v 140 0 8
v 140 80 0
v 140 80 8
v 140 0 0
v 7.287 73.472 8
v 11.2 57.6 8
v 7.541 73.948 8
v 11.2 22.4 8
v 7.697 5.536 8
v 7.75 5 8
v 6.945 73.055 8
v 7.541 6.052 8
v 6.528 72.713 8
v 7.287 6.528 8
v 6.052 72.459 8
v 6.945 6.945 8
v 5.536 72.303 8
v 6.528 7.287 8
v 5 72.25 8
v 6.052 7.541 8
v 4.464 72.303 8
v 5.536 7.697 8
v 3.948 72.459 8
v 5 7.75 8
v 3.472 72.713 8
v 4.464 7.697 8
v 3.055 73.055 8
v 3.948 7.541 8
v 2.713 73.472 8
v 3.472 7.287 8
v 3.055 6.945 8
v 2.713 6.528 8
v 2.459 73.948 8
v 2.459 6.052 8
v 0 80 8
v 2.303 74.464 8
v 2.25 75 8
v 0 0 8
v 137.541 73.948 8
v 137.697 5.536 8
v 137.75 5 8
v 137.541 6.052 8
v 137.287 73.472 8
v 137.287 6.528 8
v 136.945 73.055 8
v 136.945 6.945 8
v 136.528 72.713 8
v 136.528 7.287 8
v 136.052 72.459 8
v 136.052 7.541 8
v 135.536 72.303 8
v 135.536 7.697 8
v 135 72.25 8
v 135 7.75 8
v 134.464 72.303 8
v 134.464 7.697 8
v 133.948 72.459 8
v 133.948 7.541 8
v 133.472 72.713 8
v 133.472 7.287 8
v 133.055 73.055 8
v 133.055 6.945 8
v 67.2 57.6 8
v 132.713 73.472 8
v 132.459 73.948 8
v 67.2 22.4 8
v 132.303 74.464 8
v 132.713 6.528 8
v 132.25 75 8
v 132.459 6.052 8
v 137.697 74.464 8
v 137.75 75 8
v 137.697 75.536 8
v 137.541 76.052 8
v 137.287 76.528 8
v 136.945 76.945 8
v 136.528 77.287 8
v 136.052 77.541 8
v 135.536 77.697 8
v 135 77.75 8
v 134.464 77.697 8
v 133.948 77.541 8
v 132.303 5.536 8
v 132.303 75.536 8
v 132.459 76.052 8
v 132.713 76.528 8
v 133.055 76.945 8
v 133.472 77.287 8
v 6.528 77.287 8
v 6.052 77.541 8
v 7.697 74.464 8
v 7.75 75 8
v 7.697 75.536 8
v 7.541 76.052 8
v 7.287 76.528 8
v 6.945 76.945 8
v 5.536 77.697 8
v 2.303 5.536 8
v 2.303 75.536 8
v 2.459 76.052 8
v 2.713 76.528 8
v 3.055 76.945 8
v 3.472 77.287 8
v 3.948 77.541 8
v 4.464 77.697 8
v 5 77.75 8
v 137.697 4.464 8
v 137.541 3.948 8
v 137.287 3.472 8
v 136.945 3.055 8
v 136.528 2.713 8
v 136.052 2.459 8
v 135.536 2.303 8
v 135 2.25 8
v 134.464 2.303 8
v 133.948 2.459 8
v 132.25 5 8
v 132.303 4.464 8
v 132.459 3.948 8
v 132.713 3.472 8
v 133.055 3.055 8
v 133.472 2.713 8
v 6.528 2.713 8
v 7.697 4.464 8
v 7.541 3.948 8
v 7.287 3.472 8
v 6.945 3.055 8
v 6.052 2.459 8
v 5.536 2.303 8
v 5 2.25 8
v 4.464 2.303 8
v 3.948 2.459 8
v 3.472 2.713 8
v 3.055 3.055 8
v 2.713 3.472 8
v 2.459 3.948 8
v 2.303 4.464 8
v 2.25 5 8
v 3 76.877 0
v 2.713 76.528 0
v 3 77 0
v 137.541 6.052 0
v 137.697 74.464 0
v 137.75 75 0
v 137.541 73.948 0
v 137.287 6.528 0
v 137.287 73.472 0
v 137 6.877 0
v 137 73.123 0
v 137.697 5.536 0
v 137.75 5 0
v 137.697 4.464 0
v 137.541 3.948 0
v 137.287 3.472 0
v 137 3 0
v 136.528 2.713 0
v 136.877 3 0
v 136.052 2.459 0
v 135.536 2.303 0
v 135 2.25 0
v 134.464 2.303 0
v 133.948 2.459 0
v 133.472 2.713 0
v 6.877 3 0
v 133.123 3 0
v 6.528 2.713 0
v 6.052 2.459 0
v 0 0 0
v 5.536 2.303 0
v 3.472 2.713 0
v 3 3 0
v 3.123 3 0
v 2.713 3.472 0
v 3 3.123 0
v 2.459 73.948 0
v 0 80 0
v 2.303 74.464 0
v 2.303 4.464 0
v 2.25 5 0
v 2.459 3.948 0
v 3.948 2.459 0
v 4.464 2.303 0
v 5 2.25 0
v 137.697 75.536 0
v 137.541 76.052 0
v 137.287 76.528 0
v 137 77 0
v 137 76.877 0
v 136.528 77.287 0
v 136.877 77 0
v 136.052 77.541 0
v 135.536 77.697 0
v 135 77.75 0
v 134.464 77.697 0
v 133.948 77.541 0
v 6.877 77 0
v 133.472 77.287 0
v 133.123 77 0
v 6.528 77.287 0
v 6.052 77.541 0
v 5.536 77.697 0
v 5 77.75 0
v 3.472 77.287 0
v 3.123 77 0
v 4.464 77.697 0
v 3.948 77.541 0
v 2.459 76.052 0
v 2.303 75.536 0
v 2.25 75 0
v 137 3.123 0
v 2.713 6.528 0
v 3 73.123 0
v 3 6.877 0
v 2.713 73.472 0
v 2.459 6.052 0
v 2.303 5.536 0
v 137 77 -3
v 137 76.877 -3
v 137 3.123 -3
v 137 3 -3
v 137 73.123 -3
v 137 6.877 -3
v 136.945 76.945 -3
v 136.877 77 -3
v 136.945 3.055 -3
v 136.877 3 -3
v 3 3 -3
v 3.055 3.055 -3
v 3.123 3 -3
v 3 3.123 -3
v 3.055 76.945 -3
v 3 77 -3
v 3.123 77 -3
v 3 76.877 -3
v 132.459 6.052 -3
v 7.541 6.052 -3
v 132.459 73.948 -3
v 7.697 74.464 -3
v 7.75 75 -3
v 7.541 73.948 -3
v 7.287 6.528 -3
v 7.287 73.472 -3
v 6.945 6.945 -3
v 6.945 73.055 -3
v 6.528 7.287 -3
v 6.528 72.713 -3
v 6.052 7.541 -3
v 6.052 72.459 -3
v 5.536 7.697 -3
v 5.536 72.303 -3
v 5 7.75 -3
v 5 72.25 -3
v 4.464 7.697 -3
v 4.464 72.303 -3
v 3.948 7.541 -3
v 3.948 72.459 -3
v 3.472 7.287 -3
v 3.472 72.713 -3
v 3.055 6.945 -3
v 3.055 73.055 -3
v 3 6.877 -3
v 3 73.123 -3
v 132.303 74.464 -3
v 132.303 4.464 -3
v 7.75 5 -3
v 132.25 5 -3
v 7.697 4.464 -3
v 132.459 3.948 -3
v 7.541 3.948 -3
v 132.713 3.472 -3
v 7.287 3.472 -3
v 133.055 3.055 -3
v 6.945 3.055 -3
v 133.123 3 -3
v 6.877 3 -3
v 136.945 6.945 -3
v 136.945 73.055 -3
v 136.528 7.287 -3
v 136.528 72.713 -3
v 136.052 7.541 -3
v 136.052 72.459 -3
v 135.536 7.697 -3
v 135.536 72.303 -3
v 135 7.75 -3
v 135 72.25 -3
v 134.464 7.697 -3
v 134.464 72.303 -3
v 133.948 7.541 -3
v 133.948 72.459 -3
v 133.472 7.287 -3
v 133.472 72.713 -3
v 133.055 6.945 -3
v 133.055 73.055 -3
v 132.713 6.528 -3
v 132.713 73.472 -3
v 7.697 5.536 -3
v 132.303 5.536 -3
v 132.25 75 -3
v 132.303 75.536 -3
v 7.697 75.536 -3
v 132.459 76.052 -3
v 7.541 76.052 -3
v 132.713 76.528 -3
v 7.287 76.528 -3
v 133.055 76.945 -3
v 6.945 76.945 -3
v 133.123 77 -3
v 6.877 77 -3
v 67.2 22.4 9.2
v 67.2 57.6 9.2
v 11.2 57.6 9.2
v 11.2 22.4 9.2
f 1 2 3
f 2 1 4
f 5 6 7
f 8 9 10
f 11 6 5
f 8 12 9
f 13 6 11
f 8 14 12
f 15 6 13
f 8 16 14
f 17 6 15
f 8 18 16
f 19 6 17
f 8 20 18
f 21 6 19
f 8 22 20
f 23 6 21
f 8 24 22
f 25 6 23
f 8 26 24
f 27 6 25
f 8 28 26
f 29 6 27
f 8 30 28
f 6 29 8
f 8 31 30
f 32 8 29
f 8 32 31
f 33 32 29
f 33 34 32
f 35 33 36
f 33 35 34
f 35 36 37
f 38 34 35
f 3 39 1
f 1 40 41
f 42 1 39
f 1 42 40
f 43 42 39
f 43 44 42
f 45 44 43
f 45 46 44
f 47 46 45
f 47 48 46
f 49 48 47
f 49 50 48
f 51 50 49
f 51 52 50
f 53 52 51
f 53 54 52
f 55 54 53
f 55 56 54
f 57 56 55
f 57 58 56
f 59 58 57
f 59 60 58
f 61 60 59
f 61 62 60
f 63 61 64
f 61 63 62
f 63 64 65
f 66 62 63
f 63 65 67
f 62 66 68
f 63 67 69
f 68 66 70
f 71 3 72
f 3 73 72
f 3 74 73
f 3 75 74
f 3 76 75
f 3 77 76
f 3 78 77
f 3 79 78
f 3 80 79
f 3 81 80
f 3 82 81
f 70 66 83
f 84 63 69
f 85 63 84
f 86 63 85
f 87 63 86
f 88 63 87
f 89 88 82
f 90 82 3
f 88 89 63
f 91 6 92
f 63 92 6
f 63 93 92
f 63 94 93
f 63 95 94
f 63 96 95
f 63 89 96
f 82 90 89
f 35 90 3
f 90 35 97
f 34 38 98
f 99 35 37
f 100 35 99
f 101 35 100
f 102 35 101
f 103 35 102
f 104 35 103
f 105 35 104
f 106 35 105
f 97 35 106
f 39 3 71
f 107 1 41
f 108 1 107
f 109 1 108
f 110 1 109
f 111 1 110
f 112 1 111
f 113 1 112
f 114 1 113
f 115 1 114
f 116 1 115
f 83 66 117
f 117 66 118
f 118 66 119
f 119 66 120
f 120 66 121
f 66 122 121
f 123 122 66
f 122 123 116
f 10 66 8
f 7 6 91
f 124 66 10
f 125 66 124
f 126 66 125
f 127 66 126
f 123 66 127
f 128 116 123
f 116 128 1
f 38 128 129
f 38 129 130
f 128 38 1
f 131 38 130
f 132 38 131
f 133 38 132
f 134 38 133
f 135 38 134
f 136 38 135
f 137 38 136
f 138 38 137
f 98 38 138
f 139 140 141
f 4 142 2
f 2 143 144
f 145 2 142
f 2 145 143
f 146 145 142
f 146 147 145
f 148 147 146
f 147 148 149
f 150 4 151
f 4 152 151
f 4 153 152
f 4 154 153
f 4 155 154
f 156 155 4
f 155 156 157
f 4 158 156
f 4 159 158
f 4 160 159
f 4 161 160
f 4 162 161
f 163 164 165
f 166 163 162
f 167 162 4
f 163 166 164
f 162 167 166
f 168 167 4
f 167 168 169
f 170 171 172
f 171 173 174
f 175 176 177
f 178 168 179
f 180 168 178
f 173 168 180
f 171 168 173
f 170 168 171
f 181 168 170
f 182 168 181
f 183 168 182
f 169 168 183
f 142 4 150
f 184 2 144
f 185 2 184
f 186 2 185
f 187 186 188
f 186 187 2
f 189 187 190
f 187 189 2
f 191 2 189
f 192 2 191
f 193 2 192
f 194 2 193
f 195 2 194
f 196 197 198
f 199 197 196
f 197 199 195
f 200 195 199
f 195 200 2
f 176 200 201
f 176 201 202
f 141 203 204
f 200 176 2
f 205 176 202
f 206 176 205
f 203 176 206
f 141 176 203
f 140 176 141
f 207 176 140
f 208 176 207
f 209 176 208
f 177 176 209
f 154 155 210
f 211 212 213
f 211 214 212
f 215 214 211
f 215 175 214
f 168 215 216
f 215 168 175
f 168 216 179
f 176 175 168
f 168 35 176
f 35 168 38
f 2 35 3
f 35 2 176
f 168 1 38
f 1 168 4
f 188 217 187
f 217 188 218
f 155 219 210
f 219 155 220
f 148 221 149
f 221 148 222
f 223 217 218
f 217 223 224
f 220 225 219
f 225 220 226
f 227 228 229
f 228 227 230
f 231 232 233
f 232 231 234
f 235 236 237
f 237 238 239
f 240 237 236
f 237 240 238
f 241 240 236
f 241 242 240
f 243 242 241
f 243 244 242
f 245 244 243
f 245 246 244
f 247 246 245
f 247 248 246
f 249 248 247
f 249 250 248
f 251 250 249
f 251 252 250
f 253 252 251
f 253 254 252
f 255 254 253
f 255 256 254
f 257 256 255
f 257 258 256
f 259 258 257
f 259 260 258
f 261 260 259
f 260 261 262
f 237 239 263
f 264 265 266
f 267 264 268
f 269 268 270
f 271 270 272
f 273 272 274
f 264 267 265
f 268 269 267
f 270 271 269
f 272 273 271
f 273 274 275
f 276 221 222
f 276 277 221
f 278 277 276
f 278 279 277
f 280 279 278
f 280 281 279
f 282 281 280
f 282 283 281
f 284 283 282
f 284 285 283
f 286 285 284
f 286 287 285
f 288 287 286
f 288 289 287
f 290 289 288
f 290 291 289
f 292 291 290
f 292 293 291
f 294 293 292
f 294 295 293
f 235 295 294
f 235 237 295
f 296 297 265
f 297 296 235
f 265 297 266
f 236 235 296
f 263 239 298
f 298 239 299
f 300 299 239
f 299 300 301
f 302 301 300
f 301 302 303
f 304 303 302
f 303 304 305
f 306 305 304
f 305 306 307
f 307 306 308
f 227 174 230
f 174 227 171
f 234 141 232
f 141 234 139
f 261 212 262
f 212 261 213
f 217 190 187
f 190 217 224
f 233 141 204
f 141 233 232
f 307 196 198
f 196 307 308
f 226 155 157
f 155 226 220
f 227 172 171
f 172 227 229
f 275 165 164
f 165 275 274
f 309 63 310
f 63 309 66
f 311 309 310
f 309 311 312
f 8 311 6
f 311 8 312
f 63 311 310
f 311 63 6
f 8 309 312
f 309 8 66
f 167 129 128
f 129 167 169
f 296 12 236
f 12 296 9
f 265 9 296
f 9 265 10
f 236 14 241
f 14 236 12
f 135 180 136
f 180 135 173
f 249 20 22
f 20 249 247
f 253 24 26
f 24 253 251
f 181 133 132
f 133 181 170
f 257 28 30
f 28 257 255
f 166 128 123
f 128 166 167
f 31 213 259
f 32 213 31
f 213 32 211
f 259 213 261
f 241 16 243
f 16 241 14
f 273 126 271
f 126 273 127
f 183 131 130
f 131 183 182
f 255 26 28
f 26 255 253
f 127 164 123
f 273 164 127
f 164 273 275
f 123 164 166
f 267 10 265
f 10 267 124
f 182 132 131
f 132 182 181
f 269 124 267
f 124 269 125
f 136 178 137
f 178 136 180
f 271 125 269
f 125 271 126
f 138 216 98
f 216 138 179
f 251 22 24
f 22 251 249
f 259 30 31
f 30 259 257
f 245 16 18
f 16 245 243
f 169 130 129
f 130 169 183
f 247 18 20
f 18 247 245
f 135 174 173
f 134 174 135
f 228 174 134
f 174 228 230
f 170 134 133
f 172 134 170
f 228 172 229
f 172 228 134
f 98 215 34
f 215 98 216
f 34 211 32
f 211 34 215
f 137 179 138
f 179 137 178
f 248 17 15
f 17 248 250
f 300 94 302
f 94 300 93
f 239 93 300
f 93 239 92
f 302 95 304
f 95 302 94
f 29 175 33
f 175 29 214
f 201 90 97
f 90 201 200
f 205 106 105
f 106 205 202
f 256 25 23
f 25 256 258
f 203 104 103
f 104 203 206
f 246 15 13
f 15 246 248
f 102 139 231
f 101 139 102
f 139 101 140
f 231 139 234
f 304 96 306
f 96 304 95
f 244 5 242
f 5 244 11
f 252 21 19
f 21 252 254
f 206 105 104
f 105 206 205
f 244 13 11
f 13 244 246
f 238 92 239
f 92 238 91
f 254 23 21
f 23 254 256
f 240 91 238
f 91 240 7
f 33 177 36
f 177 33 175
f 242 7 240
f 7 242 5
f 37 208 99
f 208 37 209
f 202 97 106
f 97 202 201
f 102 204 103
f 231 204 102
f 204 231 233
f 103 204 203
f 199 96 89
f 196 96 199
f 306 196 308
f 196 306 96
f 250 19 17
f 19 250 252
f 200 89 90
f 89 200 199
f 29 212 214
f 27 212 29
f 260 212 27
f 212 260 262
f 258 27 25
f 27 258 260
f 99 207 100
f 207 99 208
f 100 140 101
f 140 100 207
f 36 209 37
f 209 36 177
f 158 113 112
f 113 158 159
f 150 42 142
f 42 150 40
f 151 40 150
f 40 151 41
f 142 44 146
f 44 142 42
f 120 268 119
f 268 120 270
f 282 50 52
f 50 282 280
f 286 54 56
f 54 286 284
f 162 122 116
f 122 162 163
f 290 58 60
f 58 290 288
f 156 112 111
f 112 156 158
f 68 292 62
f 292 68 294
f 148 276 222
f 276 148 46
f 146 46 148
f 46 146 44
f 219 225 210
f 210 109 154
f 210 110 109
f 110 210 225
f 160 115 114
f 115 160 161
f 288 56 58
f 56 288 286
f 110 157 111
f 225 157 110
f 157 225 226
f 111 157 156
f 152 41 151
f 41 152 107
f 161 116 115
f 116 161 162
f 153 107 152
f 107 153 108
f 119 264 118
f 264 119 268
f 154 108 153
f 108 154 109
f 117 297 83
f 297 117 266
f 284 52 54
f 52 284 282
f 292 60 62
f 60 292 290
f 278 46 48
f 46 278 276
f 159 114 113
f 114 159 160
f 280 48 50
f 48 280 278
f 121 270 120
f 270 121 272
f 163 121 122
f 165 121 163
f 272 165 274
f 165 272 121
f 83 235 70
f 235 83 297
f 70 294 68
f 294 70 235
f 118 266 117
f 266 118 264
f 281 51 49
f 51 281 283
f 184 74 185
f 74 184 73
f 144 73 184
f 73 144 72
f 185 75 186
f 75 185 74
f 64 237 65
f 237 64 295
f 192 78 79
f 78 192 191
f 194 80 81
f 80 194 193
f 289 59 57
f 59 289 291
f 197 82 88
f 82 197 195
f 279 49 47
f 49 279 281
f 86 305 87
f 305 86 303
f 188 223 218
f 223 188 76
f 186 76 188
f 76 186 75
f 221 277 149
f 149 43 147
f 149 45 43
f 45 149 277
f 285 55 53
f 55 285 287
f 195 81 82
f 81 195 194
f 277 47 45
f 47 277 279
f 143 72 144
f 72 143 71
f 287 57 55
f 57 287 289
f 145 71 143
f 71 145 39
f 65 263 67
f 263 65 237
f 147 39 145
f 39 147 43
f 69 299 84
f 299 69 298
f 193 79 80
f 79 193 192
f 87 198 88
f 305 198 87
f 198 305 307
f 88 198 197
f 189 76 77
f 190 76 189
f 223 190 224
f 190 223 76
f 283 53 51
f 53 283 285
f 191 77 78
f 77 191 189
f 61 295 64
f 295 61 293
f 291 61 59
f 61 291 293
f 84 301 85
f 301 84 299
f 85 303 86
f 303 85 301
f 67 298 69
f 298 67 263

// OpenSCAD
$fn = 32;

// ----------------------------------------------------------------------
// Enclosure lid: 140 x 80 x 8 mm, 4 bolt holes
// ----------------------------------------------------------------------

// --- parameters (mm) ---
length = 140;             // lid length, X
width = 80;               // lid width, Y
plate_t = 8;              // lid plate thickness
bolt_d = 5.5;             // bolt clearance
boss_lip = 5;             // bolt hole inset from the corner
sink = 1;                 // overlap of the lip and ribs into the plate
lip_h = 4;                // lip height below the plate
lip_wall = 3;             // lip wall thickness
label_h = 1.2;            // raised marking pad

module plate() {
  cube([length, width, plate_t]);
  /* lip that drops into the housing opening, sunk into the plate */
  translate([lip_wall, lip_wall, -lip_h + sink]) cube([length - 2 * lip_wall, width - 2 * lip_wall, lip_h]);
  /* raised marking pad on top, sunk 1 mm into the plate */
  translate([length * 0.08, width * 0.28, plate_t - 1]) cube([length * 0.4, width * 0.44, label_h + 1]);
}

difference() {
  plate();
  /* bolt pattern matching the corner bosses */
  for (sx = [0, 1]) for (sy = [0, 1])
    translate([sx * (length - 2 * boss_lip) + boss_lip, sy * (width - 2 * boss_lip) + boss_lip, -lip_h - 1])
      cylinder(h = plate_t + lip_h + 2, d = bolt_d);
}
